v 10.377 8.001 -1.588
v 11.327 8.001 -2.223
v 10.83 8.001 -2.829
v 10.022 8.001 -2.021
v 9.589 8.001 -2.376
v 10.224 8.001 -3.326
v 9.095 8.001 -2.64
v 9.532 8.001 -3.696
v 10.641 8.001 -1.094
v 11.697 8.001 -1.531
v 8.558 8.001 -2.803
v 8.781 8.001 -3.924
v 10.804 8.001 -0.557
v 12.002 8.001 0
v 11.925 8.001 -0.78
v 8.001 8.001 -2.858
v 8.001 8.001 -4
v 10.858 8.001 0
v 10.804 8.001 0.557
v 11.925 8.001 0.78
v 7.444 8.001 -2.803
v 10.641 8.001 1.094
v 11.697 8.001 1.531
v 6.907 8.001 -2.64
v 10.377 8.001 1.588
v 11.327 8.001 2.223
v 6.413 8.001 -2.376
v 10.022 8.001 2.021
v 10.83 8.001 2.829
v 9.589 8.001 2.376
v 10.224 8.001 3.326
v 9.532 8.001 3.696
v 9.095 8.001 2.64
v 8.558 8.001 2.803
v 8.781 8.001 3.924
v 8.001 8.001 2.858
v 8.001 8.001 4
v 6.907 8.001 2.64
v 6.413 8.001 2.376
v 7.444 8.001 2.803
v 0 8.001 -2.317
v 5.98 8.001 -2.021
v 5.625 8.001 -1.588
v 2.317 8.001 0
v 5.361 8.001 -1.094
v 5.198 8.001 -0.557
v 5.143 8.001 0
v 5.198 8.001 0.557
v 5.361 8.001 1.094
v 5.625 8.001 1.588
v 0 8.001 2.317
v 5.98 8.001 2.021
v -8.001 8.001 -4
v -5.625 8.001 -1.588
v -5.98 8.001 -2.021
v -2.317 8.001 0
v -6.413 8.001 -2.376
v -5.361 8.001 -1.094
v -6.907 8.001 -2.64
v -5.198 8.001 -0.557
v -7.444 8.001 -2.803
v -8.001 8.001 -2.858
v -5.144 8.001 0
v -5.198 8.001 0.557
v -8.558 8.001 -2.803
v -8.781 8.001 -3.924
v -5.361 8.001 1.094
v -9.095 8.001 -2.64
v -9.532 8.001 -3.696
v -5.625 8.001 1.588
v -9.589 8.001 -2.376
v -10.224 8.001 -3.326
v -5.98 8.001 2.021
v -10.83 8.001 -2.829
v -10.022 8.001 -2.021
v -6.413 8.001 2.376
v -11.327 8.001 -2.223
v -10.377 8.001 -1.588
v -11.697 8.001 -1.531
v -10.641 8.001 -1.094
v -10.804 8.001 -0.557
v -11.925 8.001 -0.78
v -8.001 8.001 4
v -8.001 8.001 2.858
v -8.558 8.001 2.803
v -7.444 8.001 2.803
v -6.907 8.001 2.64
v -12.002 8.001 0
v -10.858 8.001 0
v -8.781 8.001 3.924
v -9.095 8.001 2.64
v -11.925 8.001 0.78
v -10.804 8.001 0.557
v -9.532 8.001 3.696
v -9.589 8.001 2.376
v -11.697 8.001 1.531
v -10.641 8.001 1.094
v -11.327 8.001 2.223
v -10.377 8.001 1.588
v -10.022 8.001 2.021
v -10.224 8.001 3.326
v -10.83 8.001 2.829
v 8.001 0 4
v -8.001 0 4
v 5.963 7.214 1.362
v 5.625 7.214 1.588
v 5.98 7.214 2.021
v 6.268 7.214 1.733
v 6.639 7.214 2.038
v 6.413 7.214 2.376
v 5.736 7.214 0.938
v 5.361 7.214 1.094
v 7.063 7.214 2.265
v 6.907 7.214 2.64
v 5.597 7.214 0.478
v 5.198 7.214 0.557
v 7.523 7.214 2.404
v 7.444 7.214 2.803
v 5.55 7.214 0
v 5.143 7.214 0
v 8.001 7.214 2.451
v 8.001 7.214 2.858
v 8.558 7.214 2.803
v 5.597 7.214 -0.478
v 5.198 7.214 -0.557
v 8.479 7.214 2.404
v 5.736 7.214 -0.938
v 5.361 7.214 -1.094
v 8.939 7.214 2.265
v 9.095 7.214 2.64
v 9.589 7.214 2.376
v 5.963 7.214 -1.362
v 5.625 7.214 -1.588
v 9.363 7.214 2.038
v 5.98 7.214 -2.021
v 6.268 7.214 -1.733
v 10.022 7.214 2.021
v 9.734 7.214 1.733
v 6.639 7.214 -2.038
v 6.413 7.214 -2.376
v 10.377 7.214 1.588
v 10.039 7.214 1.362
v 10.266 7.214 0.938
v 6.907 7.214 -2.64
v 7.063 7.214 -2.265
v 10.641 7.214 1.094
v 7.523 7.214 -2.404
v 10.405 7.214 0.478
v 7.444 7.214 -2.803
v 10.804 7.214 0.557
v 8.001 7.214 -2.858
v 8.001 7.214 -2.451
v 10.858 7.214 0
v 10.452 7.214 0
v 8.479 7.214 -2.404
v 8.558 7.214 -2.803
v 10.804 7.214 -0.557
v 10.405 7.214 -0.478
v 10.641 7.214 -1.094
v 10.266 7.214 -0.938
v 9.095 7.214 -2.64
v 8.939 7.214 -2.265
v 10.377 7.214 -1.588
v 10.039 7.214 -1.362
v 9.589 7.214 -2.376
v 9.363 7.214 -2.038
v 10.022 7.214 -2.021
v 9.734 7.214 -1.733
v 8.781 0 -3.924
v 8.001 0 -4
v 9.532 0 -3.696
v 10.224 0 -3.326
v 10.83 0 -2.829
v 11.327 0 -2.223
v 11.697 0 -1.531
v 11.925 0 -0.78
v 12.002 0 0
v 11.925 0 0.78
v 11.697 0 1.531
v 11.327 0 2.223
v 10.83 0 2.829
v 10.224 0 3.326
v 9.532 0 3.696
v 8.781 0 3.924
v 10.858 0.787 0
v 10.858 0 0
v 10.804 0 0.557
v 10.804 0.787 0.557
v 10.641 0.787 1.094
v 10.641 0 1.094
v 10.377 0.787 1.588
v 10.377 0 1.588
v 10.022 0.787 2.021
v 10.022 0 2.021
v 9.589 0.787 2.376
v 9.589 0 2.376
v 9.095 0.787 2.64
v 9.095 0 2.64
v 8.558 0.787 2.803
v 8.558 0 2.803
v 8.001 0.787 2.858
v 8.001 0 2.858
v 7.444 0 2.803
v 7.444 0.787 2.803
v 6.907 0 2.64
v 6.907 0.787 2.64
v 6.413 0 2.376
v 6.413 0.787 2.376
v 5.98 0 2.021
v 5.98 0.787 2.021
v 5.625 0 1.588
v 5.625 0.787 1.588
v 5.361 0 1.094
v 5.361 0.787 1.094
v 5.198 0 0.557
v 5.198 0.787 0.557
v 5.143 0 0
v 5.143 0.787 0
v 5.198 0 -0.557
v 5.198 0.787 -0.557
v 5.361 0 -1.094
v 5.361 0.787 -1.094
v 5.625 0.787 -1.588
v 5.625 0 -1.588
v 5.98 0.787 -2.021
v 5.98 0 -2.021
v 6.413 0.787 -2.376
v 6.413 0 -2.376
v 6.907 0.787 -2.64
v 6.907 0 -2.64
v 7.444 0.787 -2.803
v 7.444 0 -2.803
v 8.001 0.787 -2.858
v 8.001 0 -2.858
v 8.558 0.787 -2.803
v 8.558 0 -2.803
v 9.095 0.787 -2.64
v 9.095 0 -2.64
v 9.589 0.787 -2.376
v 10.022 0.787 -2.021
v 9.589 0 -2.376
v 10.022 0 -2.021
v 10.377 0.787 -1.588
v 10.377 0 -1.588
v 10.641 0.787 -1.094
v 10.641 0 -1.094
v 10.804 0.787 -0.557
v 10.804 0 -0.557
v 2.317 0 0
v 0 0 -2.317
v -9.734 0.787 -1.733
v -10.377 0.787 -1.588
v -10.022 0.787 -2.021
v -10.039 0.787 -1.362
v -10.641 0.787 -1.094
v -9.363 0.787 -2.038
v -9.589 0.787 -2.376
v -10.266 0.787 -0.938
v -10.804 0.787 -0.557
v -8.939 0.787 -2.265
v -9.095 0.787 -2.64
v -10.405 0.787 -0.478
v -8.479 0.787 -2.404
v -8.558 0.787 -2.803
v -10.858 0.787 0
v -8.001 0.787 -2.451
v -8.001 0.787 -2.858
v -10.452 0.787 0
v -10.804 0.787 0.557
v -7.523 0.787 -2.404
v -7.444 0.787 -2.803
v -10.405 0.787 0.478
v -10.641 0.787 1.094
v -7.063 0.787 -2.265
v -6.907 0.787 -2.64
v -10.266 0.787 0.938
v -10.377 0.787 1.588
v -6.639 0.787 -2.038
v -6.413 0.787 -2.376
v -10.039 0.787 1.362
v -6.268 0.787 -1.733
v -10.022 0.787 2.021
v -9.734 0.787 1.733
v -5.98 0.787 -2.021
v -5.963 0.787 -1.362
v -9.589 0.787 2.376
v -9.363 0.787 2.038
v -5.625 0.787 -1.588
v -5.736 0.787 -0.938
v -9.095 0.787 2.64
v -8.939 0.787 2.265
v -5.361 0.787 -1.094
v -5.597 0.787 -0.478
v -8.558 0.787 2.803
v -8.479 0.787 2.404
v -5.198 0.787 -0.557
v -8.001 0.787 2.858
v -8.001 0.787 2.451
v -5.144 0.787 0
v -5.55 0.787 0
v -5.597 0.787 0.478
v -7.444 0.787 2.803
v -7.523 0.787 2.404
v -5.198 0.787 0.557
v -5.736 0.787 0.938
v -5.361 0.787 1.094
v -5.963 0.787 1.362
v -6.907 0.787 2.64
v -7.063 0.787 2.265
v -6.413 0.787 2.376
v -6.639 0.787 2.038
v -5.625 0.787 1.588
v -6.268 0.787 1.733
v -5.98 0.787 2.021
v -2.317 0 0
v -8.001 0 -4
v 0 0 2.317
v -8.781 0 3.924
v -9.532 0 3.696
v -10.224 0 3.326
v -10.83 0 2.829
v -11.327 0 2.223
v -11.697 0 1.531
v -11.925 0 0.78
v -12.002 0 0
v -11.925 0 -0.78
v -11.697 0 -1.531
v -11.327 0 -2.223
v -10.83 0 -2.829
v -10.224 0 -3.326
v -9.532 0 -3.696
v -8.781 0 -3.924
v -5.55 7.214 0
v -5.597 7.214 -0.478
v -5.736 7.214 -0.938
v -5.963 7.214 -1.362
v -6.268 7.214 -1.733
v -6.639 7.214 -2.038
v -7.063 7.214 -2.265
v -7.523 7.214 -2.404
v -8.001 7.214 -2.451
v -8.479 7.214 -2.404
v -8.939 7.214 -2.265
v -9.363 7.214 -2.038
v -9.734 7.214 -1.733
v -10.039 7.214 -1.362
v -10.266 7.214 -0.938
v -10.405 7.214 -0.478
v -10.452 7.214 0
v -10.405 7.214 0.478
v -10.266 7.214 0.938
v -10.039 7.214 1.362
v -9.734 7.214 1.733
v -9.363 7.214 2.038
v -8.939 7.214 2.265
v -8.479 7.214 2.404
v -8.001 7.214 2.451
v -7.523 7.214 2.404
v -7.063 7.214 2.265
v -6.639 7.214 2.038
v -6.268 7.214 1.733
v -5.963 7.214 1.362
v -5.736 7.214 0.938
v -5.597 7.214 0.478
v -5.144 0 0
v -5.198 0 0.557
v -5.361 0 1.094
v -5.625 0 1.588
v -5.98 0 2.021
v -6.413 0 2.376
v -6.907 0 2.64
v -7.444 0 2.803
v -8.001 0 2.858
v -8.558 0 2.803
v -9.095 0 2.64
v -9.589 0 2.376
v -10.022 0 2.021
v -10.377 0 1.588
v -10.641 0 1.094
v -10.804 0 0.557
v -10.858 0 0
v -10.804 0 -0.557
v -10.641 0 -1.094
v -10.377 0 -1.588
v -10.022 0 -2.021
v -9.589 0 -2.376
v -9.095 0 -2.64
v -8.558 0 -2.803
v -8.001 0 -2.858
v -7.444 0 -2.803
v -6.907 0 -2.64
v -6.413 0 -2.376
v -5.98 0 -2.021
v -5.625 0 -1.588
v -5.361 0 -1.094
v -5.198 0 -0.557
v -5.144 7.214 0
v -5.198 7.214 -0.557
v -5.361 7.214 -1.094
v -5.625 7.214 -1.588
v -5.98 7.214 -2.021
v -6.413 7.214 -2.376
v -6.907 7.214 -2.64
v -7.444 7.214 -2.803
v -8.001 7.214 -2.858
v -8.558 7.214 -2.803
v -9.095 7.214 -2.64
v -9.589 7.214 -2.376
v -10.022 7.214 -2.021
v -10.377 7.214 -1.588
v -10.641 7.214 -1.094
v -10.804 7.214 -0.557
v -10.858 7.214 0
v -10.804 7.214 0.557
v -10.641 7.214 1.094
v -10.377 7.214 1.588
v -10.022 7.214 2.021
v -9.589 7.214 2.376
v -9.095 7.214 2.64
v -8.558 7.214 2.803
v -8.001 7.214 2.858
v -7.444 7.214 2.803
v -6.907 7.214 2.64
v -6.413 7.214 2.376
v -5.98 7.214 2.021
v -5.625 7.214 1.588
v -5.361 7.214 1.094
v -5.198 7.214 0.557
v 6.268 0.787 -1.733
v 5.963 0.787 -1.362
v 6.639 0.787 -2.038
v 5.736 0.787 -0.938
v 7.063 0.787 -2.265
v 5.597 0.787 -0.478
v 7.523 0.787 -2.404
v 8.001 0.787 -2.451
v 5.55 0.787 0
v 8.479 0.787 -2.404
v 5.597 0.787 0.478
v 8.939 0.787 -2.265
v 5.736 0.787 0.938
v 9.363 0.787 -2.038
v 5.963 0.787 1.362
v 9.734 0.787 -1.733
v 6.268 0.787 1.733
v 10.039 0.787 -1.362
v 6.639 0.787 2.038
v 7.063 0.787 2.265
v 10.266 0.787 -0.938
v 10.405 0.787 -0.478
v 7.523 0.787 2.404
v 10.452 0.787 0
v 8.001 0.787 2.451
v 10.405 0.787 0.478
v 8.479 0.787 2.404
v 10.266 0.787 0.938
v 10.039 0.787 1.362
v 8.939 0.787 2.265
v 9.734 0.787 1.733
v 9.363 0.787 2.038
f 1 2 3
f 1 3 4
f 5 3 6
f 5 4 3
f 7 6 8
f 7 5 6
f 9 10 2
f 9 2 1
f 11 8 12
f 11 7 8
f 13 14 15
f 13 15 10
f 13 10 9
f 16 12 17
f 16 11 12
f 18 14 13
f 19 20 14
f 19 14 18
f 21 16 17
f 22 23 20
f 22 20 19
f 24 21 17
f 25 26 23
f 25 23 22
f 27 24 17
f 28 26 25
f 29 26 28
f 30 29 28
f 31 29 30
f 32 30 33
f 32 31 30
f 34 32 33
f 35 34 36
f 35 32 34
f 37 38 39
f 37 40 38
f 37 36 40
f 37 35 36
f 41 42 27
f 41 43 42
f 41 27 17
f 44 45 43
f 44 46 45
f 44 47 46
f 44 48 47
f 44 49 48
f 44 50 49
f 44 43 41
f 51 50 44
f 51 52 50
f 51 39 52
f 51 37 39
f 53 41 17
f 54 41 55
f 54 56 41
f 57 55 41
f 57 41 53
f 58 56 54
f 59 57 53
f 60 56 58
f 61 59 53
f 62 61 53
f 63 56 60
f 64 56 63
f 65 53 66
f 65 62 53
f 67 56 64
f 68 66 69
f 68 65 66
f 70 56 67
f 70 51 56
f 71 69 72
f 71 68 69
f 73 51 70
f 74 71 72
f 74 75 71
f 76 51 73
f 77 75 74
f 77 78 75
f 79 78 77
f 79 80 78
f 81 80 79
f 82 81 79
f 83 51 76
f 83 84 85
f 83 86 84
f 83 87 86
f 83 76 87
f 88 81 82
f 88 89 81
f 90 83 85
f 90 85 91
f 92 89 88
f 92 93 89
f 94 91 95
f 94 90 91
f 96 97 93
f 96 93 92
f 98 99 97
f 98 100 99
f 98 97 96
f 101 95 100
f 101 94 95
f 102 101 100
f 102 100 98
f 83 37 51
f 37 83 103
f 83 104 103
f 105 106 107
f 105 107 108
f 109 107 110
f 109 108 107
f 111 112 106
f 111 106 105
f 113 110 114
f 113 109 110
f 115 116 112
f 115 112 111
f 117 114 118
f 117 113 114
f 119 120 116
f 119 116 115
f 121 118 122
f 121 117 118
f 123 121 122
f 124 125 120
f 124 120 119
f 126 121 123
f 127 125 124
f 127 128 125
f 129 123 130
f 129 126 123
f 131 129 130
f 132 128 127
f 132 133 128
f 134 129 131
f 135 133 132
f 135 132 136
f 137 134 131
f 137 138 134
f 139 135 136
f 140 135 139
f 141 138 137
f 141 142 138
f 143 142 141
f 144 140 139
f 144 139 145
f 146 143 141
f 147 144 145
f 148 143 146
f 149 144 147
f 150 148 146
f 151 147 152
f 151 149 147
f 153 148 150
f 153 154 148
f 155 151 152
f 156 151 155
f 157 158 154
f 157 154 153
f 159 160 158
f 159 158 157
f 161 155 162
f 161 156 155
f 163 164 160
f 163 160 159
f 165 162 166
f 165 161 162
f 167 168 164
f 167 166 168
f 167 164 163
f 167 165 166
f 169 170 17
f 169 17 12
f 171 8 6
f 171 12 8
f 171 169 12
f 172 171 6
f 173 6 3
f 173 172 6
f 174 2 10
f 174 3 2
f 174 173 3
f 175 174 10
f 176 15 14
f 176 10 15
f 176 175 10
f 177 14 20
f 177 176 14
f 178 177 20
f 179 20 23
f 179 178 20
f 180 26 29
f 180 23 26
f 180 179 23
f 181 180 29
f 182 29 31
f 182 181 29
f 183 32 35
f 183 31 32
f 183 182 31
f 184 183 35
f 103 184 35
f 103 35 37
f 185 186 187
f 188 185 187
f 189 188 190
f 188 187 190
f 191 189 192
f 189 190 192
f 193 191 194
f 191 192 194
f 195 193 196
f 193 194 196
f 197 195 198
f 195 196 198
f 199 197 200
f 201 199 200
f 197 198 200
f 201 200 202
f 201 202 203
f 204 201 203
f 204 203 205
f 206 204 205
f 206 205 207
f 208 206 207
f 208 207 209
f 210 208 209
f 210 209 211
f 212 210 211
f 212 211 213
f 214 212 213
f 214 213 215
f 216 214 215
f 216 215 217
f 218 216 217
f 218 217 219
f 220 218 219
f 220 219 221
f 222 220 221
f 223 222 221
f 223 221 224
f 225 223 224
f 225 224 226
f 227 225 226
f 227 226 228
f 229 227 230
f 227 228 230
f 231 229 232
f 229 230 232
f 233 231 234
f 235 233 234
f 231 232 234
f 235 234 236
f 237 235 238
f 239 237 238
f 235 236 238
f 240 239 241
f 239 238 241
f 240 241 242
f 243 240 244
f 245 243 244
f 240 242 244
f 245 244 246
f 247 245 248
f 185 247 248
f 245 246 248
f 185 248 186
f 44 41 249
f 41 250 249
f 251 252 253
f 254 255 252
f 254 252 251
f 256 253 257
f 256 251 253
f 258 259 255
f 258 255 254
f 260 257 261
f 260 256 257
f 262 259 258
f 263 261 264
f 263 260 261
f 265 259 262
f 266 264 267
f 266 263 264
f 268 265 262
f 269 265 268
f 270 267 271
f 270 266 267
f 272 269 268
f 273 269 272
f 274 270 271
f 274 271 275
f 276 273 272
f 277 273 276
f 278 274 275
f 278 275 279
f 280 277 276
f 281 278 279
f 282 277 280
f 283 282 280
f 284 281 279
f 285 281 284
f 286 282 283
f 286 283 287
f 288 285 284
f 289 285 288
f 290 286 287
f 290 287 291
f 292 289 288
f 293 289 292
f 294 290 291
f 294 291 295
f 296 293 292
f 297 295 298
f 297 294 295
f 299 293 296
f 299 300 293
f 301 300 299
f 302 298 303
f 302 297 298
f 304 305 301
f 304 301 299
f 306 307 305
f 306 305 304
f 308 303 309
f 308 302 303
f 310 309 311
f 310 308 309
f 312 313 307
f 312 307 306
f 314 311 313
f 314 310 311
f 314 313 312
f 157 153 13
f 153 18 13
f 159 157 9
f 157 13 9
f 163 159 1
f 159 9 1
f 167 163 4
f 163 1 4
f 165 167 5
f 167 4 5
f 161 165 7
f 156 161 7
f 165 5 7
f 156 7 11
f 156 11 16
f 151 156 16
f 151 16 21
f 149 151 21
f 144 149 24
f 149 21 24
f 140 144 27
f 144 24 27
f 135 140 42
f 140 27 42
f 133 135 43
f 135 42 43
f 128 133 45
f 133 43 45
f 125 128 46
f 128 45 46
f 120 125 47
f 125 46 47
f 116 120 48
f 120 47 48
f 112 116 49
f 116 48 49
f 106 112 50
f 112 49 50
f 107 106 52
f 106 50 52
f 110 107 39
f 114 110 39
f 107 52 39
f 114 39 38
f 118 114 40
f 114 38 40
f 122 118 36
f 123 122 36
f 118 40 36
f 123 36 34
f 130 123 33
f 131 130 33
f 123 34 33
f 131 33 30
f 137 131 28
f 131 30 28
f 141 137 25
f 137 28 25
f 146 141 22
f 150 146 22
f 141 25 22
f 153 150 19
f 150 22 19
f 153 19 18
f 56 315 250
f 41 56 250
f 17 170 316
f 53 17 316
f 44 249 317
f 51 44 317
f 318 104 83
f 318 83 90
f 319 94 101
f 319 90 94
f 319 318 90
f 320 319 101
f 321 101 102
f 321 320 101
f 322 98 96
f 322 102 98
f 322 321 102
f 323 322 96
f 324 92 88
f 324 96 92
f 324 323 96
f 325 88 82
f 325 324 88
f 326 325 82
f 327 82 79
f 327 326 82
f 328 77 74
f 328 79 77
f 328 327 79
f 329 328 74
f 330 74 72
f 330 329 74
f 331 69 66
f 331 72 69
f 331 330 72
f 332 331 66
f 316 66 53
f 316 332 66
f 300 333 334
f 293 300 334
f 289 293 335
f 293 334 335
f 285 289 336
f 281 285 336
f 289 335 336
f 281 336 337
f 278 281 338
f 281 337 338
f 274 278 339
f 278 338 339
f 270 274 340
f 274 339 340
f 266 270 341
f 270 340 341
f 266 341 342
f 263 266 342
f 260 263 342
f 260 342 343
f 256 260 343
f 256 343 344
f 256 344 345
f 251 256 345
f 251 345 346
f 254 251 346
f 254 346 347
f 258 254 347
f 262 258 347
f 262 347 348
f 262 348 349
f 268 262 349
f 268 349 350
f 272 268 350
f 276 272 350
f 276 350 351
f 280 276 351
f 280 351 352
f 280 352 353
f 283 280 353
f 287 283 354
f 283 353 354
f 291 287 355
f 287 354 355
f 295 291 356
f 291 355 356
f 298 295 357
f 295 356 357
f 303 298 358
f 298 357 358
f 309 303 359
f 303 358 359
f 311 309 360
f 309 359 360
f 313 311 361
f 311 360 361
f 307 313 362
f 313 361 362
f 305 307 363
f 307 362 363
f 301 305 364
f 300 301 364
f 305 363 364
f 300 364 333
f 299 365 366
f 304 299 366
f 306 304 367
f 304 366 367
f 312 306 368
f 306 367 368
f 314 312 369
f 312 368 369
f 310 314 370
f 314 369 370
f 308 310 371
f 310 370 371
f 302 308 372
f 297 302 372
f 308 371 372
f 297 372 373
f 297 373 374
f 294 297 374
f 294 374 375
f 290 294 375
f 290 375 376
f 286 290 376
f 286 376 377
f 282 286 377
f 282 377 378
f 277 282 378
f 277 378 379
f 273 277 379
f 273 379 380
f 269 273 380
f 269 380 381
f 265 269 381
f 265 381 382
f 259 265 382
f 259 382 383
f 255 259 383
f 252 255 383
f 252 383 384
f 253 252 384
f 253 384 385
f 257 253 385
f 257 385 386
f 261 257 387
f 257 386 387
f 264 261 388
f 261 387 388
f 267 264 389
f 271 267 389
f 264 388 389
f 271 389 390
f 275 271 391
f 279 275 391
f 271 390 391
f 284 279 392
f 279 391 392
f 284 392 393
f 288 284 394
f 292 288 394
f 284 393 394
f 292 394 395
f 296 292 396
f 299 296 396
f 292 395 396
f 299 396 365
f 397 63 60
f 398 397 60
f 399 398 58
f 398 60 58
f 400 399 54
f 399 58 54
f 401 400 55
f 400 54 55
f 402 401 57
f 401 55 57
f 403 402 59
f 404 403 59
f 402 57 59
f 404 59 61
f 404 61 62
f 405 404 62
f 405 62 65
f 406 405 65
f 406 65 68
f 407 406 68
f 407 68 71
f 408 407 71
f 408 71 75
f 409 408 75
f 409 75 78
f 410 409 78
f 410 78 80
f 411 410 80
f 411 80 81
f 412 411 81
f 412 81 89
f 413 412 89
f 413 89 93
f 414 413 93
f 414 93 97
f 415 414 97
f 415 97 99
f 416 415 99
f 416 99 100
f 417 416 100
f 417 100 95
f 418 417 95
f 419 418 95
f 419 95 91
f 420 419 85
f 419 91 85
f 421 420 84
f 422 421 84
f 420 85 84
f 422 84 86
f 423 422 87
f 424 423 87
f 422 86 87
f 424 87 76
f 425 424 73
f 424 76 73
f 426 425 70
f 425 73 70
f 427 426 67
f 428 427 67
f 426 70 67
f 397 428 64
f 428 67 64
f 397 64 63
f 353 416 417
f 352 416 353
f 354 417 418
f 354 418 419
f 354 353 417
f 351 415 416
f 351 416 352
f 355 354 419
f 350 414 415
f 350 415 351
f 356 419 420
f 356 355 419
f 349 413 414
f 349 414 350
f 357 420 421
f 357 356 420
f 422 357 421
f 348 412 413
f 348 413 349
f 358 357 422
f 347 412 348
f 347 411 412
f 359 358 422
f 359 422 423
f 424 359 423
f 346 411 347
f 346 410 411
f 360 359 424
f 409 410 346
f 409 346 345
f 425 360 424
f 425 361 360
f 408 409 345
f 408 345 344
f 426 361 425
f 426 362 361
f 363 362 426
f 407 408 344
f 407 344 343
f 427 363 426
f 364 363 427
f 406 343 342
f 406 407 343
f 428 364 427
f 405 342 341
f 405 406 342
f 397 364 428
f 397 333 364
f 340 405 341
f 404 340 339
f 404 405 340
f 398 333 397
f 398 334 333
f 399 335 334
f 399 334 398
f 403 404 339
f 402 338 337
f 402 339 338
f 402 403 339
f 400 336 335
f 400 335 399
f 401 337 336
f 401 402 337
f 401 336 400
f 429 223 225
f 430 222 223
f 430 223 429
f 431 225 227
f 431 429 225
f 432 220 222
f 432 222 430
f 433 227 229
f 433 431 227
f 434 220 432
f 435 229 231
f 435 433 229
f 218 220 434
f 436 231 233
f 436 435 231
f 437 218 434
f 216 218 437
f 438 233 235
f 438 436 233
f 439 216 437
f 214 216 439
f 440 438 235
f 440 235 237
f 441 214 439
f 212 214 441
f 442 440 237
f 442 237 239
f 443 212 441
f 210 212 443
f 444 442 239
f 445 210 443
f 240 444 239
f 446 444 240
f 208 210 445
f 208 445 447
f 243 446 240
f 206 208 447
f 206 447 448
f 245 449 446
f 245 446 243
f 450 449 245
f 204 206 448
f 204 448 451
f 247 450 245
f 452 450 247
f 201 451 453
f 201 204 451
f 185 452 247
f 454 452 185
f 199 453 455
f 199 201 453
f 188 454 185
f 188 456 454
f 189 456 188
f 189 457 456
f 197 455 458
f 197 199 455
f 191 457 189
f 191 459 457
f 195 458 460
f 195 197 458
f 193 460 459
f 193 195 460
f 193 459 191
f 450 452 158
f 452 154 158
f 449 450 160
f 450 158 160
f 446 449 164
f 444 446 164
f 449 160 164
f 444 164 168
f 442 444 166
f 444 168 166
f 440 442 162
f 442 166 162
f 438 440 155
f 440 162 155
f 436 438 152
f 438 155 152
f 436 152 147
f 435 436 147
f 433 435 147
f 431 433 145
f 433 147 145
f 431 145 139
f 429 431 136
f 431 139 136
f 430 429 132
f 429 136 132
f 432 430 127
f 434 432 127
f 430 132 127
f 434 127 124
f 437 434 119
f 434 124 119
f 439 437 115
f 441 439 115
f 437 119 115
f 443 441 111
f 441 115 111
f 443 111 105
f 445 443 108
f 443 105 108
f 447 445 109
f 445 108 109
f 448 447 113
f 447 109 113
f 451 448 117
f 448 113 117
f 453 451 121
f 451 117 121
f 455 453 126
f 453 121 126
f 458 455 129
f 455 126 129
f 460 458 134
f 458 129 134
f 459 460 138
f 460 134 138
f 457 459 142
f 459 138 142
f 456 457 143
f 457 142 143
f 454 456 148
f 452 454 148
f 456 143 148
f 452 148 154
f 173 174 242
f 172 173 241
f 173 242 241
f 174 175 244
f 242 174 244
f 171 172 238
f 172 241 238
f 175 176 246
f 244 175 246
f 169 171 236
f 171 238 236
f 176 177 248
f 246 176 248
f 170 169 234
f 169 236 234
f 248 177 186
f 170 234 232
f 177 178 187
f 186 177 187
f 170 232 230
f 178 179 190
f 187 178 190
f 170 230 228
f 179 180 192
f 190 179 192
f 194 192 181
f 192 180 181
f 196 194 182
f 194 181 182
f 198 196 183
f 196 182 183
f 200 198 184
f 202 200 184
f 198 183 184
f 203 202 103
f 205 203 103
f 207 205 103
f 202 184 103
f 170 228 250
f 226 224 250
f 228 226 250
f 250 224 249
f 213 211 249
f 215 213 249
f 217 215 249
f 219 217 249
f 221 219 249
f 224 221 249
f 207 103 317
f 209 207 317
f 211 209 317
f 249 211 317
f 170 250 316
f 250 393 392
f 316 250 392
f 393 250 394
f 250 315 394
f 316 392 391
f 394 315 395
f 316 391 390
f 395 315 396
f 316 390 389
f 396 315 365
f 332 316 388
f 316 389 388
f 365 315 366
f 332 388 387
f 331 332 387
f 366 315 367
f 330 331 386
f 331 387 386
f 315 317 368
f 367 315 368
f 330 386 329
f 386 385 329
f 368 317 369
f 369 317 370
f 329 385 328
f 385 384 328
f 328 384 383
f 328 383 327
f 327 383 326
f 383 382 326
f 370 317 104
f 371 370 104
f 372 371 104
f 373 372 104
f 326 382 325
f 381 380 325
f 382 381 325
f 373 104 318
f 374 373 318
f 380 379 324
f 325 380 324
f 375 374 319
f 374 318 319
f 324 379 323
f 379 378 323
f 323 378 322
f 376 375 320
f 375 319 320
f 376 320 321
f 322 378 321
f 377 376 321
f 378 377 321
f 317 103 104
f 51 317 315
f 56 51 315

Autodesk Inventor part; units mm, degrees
ref_plane "YZ Plane" through (0, 0, 0) normal (1, 0, 0) x (0, 1, 0)
ref_plane "XZ Plane" through (0, 0, 0) normal (0, 1, 0) x (-1, 0, 0)
ref_plane "XY Plane" through (0, 0, 0) normal (0, 0, 1) x (1, 0, 0)
sketch "Sketch1" plane through (0, 0, 0) normal (0, 1, 0) x (-1, 0, 0)
  line L0 (-8.001, 0) -> (8.001, 0) construction
  line L1 (-8.001, -4.0005) -> (8.001, -4.0005)
  line L2 (8.001, 4.0005) -> (-8.001, 4.0005)
  arc A0 (-8.001, 4.0005) -> (-8.001, -4.0005) centre (-8.001, 0) ccw
  arc A1 (8.001, -4.0005) -> (8.001, 4.0005) centre (8.001, 0) ccw
  line L3 (-2.3169, 0) -> (0, 2.3169)
  line L4 (0, 2.3169) -> (2.3169, 0)
  line L5 (2.3169, 0) -> (0, -2.3169)
  line L6 (0, -2.3169) -> (-2.3169, 0)
  line L7 (-2.3169, 0) -> (2.3169, 0) construction
  line L8 (0, 2.3169) -> (0, -2.3169) construction
  point P0 (0, 0)
  dimension "d0" = 8.001
  dimension "d1" = 8.001
  dimension "d2" = 3.2766
  dimension "d3" = 3.2766
extrude "Extrusion1" add sketch "Sketch1" along normal blind 8.001
sketch "Sketch2" plane through (0, 8.001, 0) normal (0, 1, 0) x (1, 0, 0)
  circle A0 centre (-8.001, 0) radius 2.8575
  point P0 (0, 0)
  dimension "d6" = 8.001
  dimension "d7" = 5.715
extrude "Extrusion2" cut sketch "Sketch2" against normal blind 0.7874
sketch "Sketch3" plane through (0, 8.001, 0) normal (0, 1, 0) x (1, 0, 0)
  circle A0 centre (8.001, 0) radius 2.8575
  point P0 (0, 0)
  dimension "d10" = 8.001
  dimension "d11" = 5.715
extrude "Extrusion3" cut sketch "Sketch3" against normal blind 0.7874
sketch "Sketch4" plane through (0, 0, 0) normal (0, -1, 0) x (1, 0, 0)
  circle A0 centre (8.001, 0) radius 2.8575 projected
  circle A1 centre (8.001, 0) radius 2.8575
  point P0 (0, 0)
extrude "Extrusion4" cut sketch "Sketch4" against normal blind 0.7874
sketch "Sketch5" plane through (0, 0, 0) normal (0, -1, 0) x (1, 0, 0)
  circle A0 centre (-8.001, 0) radius 2.8575 projected
  circle A1 centre (-8.001, 0) radius 2.8575
  point P0 (0, 0)
extrude "Extrusion5" cut sketch "Sketch5" against normal blind 0.7874
sketch "Sketch6" plane through (-8.001, 7.2136, 0) normal (0, 1, 0) x (1, 0, 0)
  circle A0 centre (0, 0) radius 2.4511
  point P0 (8.001, 0)
  dimension "d18" = 4.9022
extrude "Extrusion6" cut sketch "Sketch6" against normal through all
sketch "Sketch7" plane through (8.001, 7.2136, 0) normal (0, 1, 0) x (1, 0, 0)
  circle A0 centre (0, 0) radius 2.4511
  point P0 (-8.001, 0)
  dimension "d21" = 4.9022
extrude "Extrusion7" cut sketch "Sketch7" against normal through all
properties part number "VexLegoCouplerBasic"
